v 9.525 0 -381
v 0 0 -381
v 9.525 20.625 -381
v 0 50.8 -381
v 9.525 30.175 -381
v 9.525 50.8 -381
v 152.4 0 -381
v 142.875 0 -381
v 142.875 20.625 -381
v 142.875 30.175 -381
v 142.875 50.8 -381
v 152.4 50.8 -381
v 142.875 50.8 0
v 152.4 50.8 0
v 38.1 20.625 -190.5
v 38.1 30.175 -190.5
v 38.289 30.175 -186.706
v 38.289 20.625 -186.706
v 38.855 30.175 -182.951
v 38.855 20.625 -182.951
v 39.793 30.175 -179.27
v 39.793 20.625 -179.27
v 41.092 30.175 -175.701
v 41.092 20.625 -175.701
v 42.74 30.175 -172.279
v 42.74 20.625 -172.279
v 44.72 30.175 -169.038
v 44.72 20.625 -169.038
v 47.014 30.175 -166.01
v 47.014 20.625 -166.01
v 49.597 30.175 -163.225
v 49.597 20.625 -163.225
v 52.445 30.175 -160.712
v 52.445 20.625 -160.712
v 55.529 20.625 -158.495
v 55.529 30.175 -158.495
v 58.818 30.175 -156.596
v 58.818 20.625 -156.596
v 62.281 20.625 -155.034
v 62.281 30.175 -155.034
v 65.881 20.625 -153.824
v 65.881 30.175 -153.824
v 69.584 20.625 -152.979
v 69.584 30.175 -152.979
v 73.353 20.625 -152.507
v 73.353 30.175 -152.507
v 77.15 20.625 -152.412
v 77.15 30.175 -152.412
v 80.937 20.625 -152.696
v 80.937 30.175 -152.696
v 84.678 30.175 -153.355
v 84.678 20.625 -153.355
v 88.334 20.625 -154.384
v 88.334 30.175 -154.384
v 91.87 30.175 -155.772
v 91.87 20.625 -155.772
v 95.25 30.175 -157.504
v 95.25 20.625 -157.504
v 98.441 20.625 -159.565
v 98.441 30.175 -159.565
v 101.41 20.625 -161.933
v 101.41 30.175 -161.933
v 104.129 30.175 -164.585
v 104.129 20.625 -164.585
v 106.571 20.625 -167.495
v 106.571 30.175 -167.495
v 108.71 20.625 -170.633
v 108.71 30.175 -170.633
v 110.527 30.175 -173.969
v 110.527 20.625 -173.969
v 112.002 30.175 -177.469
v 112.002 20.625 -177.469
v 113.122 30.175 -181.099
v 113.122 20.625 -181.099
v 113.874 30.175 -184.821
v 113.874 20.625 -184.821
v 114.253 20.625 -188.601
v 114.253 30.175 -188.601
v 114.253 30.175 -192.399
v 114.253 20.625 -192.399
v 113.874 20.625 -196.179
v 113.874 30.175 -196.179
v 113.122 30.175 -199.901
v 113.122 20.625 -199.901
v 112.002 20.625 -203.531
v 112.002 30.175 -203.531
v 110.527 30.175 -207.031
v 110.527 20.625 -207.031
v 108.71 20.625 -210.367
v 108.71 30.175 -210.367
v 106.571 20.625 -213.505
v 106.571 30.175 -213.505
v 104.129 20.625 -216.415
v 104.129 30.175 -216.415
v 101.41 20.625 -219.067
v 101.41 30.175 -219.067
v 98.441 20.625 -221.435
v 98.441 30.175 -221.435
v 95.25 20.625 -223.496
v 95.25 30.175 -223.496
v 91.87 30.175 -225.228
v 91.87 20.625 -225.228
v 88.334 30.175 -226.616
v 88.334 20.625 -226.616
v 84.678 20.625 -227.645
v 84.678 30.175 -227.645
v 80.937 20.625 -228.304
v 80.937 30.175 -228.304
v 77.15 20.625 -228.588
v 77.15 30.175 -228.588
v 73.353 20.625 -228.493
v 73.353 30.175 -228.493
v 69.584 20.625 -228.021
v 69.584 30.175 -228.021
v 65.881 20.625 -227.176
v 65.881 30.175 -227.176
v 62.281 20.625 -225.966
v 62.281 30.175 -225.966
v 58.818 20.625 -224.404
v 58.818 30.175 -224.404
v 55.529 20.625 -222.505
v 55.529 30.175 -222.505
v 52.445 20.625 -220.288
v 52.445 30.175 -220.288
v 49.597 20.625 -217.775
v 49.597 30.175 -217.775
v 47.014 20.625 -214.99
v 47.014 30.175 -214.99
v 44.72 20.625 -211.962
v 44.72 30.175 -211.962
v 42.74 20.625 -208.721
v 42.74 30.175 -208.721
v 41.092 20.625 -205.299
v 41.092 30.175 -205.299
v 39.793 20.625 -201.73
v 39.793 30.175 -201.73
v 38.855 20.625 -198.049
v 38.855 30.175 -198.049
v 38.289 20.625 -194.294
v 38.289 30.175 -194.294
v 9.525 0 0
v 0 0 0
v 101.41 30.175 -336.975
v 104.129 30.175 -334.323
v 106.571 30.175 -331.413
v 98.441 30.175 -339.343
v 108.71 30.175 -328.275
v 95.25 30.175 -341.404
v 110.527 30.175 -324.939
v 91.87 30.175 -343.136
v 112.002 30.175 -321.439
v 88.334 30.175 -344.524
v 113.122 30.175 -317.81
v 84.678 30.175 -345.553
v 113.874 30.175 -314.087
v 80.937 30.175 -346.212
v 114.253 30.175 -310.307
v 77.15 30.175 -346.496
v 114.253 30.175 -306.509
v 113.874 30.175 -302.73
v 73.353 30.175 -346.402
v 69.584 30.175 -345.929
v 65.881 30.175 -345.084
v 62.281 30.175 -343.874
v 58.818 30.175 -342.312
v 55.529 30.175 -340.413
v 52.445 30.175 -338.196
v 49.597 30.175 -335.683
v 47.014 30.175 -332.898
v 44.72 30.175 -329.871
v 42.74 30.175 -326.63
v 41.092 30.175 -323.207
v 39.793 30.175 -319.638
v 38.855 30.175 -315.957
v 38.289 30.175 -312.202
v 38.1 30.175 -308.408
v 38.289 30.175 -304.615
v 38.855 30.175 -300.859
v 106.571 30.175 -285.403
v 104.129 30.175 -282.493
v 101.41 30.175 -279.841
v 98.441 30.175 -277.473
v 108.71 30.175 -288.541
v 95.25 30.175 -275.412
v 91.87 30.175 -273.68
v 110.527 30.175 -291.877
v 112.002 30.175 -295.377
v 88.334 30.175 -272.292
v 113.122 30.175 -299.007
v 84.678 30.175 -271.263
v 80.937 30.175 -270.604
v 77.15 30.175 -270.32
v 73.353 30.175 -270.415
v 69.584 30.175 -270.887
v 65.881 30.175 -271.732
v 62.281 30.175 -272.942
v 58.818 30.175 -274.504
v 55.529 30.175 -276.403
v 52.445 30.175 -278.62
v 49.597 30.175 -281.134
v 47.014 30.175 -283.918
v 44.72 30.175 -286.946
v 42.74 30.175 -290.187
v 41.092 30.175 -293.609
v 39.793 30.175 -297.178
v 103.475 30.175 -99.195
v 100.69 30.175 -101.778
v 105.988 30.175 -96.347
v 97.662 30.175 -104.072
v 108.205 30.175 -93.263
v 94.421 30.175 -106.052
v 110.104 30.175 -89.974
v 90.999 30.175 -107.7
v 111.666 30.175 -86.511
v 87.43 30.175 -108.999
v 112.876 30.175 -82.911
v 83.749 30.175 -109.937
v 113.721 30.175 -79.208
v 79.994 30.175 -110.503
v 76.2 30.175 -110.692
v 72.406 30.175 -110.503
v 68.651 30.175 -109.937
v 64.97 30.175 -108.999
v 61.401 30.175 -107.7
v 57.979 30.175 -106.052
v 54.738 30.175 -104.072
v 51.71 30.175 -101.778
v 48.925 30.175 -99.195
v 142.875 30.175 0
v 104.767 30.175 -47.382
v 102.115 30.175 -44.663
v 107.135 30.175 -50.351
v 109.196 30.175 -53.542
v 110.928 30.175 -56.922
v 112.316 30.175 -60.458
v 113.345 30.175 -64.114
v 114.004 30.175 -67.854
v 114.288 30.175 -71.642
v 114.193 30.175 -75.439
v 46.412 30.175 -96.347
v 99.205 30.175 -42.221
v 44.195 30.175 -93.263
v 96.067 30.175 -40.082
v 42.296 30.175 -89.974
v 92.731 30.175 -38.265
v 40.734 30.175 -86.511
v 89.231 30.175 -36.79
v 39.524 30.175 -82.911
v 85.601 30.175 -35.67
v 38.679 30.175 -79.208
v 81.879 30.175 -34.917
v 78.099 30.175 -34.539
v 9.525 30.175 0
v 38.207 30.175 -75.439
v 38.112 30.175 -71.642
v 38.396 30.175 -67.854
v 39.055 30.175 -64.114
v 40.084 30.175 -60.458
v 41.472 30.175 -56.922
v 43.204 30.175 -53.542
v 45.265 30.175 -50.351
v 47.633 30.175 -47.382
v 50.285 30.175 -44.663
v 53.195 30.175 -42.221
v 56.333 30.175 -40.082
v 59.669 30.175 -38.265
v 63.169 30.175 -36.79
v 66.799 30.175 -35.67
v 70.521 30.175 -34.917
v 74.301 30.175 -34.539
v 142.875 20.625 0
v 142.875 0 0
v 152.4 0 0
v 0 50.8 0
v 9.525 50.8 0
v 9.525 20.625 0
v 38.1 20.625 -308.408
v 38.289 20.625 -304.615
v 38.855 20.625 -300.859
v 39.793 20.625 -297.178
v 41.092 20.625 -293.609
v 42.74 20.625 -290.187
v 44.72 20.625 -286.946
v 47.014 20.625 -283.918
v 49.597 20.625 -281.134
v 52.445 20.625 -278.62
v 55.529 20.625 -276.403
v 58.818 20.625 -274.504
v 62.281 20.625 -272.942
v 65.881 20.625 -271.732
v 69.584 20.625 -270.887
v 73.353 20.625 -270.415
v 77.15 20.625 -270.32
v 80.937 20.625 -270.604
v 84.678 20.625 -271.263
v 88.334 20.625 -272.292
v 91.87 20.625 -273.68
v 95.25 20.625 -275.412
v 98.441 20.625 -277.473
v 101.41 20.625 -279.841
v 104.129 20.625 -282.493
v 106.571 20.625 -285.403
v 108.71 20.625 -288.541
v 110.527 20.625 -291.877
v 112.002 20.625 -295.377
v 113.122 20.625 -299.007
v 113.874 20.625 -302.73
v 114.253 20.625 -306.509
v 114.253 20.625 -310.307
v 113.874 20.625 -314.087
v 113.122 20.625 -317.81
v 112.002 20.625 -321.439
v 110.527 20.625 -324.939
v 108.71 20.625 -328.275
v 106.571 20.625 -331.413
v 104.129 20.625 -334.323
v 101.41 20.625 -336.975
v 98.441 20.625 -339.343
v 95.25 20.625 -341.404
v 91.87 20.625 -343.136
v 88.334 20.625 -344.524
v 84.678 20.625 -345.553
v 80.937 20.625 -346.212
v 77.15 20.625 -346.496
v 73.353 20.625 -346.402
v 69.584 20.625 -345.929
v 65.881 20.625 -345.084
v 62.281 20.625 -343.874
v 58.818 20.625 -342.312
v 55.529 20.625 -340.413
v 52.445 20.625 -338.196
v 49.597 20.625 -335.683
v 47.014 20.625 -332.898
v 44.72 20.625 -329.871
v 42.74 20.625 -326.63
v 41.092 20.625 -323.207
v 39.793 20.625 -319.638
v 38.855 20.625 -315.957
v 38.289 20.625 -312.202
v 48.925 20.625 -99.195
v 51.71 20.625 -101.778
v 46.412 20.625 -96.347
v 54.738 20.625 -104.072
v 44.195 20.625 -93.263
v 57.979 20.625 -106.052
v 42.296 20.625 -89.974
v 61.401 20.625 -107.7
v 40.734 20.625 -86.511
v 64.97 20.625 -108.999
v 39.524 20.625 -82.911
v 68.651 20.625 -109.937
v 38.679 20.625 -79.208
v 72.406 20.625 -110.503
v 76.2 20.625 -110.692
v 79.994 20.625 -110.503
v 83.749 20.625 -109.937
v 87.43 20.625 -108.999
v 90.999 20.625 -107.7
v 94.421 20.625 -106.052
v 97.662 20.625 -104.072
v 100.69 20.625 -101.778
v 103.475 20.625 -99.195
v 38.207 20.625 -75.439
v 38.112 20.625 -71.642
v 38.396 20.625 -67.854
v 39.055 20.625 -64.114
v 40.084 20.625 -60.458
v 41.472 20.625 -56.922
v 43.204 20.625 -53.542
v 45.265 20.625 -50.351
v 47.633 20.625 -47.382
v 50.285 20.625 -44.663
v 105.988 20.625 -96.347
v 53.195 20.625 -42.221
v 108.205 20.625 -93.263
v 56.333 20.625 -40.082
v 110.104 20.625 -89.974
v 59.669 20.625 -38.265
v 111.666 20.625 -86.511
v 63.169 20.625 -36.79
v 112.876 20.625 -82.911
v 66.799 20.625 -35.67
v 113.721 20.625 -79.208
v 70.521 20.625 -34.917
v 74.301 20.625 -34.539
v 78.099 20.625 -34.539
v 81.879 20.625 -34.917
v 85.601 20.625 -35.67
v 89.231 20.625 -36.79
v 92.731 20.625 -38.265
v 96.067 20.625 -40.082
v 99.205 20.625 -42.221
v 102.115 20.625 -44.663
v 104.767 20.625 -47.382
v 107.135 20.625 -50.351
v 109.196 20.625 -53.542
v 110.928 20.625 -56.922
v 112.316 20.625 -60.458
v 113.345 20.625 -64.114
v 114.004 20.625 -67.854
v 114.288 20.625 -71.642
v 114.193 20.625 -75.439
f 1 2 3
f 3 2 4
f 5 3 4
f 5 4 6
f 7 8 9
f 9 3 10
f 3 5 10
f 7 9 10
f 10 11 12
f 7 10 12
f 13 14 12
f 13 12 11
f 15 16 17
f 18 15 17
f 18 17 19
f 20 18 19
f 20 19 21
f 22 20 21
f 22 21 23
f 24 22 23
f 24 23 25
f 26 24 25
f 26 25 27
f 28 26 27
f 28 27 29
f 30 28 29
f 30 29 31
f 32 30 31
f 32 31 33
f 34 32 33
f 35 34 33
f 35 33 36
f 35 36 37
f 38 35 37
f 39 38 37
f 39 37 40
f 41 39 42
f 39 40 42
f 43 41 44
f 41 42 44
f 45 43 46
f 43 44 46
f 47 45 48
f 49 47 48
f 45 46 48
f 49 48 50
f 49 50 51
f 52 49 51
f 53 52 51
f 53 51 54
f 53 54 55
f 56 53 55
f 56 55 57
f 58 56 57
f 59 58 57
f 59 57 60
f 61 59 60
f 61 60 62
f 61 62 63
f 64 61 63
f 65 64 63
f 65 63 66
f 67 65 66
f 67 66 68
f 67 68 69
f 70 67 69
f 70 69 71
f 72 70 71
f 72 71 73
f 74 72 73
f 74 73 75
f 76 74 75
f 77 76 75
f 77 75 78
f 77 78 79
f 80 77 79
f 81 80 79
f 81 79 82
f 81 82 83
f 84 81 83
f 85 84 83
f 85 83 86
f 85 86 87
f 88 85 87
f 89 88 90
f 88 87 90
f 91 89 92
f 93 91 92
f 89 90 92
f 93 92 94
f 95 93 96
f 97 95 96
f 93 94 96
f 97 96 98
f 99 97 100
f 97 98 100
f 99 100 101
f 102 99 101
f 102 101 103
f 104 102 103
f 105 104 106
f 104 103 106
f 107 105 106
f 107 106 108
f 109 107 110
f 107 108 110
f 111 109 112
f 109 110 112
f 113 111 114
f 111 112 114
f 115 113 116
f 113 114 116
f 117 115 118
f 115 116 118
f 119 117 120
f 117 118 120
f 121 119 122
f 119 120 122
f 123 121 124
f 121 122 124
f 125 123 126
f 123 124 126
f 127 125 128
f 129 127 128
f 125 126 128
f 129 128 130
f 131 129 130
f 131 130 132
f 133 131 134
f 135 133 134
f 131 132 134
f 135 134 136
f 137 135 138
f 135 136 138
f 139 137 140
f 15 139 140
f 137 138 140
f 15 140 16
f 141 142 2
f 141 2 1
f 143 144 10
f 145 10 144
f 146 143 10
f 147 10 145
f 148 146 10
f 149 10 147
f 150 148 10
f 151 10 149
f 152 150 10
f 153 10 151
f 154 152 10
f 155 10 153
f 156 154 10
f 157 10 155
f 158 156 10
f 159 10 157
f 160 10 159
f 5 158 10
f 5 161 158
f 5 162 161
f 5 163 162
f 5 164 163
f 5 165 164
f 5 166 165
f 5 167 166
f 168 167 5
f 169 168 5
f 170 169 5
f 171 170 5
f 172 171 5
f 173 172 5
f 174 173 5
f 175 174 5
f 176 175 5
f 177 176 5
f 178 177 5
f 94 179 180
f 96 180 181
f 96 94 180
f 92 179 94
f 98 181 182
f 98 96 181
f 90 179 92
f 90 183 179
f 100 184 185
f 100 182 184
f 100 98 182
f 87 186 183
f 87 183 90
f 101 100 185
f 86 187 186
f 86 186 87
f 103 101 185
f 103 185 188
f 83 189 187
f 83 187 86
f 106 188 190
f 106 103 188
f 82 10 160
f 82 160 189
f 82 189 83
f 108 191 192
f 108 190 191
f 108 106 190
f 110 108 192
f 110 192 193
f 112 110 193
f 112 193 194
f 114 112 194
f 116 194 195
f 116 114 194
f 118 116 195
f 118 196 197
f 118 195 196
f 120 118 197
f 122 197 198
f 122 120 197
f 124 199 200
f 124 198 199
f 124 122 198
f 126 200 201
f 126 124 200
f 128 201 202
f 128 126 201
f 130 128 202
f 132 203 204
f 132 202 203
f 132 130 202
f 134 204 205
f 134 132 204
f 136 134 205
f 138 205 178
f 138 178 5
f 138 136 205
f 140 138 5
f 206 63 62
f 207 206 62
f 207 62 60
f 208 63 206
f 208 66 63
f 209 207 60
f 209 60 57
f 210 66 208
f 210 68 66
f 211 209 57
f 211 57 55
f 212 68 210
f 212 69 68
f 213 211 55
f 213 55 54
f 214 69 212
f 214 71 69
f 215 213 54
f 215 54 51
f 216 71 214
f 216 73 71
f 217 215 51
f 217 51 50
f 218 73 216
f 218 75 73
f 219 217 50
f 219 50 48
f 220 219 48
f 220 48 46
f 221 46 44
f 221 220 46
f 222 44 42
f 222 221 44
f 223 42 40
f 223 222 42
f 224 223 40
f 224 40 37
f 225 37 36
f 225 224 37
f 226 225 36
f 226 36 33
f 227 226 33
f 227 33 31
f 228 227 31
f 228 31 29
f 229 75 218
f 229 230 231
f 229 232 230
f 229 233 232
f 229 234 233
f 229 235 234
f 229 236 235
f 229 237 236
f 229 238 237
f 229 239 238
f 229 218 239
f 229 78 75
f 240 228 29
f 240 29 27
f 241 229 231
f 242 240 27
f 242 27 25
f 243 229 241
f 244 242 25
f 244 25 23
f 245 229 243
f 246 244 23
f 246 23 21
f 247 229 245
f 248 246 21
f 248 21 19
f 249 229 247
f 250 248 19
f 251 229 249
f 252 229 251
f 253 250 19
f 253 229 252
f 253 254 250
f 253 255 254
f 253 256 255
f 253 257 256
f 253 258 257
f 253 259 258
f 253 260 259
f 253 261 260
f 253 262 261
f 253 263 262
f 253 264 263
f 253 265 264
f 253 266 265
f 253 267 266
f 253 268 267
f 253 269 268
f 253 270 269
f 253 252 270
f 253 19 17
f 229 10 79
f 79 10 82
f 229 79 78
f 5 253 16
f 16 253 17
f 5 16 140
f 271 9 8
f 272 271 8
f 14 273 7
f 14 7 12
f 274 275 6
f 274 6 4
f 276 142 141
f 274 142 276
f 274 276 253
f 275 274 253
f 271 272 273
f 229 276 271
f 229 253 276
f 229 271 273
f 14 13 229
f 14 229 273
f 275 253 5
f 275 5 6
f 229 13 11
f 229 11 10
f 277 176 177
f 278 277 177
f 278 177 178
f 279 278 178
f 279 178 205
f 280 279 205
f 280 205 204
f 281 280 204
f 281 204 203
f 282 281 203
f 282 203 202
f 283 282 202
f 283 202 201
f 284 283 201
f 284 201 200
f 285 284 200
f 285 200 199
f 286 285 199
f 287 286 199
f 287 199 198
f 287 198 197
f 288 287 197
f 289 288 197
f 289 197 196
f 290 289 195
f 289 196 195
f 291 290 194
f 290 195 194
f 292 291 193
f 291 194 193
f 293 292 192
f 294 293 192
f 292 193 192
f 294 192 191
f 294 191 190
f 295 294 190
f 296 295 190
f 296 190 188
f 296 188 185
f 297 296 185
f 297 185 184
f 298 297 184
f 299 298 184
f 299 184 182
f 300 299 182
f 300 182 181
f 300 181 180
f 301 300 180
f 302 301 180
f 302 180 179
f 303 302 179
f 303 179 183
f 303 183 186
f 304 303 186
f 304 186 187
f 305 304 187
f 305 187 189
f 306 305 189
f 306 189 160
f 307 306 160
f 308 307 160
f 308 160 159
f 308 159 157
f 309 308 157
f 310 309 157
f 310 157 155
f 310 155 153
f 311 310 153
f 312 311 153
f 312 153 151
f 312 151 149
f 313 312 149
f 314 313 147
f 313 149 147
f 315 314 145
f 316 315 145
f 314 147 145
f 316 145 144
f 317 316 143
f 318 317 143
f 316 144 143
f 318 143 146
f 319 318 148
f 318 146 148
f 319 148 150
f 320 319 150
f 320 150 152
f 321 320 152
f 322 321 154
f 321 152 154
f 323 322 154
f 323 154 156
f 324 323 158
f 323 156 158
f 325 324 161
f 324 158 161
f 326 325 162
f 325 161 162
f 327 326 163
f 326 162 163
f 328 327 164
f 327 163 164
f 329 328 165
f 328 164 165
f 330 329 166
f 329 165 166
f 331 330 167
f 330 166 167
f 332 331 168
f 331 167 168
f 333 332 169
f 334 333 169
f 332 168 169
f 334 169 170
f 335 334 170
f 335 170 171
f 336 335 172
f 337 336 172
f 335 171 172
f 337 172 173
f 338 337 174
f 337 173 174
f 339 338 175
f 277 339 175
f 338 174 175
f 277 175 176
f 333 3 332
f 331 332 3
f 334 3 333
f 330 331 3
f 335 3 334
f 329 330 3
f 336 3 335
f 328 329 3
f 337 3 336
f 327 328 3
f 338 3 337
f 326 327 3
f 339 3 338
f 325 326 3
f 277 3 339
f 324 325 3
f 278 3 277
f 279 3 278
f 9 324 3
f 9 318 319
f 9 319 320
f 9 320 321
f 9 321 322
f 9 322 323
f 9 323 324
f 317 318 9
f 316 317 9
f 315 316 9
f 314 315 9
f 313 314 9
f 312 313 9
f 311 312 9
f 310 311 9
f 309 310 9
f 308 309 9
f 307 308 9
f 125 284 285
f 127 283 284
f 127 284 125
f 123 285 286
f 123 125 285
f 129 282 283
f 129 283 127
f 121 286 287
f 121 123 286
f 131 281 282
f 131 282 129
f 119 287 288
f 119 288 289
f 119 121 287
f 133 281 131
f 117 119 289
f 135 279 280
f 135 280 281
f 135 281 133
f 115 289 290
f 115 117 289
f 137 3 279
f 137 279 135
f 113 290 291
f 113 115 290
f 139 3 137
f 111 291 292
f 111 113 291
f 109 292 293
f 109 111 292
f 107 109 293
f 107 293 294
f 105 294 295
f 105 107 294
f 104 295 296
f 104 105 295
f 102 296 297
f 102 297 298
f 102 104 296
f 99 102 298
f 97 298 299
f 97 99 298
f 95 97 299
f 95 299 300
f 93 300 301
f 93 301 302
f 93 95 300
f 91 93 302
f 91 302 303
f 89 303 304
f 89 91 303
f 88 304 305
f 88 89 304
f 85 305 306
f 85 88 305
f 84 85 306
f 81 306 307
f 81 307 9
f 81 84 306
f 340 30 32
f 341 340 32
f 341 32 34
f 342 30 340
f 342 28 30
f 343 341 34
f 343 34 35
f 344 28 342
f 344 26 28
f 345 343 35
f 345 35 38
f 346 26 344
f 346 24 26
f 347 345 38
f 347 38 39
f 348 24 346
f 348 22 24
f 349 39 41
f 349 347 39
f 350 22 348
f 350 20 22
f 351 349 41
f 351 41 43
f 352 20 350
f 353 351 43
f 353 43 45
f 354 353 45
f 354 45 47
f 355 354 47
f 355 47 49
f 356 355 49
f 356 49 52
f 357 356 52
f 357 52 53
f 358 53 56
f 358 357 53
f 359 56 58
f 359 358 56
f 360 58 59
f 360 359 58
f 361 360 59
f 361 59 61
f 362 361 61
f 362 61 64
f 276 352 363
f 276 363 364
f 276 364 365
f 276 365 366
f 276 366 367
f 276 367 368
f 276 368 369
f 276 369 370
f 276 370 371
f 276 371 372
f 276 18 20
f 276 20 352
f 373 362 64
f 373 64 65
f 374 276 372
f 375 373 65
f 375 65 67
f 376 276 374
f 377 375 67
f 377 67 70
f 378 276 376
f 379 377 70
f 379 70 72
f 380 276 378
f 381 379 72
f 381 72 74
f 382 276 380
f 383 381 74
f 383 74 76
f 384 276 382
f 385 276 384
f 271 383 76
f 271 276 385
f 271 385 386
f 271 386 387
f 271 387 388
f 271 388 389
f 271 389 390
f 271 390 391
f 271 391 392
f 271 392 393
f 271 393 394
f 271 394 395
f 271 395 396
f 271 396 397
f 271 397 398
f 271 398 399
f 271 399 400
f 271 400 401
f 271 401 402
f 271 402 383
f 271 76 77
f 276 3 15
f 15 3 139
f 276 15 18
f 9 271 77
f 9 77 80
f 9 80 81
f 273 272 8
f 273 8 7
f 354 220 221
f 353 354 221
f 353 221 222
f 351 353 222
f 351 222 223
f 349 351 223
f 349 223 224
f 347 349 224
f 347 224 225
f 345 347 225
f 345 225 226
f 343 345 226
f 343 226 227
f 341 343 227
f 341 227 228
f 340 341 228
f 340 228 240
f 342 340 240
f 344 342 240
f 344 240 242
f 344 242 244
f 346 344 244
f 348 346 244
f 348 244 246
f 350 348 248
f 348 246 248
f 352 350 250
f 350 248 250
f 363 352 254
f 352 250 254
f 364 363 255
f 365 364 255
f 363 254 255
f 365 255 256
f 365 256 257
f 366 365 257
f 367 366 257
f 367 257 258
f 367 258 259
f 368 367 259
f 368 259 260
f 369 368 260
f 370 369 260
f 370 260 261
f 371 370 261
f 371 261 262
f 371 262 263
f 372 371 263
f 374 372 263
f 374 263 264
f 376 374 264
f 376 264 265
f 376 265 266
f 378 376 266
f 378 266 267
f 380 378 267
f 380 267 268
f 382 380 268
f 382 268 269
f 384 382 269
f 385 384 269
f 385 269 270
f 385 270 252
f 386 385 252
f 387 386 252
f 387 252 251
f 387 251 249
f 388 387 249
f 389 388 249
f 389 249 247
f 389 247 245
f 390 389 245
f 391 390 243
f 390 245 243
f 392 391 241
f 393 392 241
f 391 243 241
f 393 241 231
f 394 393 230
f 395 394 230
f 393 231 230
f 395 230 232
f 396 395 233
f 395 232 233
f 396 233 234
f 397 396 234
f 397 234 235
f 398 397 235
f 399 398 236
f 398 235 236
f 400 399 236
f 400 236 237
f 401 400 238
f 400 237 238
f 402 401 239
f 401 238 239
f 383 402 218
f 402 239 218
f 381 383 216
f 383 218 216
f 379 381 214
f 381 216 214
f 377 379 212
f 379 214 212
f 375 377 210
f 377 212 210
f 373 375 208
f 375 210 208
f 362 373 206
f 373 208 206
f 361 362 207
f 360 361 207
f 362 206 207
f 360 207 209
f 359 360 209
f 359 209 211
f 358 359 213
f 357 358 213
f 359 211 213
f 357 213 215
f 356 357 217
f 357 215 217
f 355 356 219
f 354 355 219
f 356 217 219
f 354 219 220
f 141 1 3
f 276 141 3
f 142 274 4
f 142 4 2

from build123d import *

# Parameters (mm, degrees)
BOSS_EXTRUDE1_DEPTH = 381
SKETCH2_R           = 38.1
CUT_EXTRUDE1_DEPTH  = 889


with BuildPart() as part:
    # Sketch1 → Boss-Extrude1 (new body)
    with BuildSketch(Plane.XY):
        Polygon((0, 0), (9.525, 0), (9.525, 20.6248), (142.875, 20.6248), (142.875, 0), (152.4, 0), (152.4, 50.8), (142.875, 50.8), (142.875, 30.1752), (9.525, 30.1752), (9.525, 50.8), (0, 50.8), align=None)
    extrude(amount=-BOSS_EXTRUDE1_DEPTH)

    # Sketch2 → Cut-Extrude1 (cut)
    with BuildSketch(Plane(origin=(0, 30.1752, 0), x_dir=(-1, 0, 0), z_dir=(0, 1, 0))):
        with Locations((-76.2, -308.408066116)):
            Circle(SKETCH2_R)
        with Locations((-76.2, -190.5)):
            Circle(SKETCH2_R)
        with Locations(Location((-76.2, -72.591933884, 0), (0, 0, 270))):
            Circle(SKETCH2_R)
    extrude(amount=-CUT_EXTRUDE1_DEPTH, mode=Mode.SUBTRACT)


solid = part.part
